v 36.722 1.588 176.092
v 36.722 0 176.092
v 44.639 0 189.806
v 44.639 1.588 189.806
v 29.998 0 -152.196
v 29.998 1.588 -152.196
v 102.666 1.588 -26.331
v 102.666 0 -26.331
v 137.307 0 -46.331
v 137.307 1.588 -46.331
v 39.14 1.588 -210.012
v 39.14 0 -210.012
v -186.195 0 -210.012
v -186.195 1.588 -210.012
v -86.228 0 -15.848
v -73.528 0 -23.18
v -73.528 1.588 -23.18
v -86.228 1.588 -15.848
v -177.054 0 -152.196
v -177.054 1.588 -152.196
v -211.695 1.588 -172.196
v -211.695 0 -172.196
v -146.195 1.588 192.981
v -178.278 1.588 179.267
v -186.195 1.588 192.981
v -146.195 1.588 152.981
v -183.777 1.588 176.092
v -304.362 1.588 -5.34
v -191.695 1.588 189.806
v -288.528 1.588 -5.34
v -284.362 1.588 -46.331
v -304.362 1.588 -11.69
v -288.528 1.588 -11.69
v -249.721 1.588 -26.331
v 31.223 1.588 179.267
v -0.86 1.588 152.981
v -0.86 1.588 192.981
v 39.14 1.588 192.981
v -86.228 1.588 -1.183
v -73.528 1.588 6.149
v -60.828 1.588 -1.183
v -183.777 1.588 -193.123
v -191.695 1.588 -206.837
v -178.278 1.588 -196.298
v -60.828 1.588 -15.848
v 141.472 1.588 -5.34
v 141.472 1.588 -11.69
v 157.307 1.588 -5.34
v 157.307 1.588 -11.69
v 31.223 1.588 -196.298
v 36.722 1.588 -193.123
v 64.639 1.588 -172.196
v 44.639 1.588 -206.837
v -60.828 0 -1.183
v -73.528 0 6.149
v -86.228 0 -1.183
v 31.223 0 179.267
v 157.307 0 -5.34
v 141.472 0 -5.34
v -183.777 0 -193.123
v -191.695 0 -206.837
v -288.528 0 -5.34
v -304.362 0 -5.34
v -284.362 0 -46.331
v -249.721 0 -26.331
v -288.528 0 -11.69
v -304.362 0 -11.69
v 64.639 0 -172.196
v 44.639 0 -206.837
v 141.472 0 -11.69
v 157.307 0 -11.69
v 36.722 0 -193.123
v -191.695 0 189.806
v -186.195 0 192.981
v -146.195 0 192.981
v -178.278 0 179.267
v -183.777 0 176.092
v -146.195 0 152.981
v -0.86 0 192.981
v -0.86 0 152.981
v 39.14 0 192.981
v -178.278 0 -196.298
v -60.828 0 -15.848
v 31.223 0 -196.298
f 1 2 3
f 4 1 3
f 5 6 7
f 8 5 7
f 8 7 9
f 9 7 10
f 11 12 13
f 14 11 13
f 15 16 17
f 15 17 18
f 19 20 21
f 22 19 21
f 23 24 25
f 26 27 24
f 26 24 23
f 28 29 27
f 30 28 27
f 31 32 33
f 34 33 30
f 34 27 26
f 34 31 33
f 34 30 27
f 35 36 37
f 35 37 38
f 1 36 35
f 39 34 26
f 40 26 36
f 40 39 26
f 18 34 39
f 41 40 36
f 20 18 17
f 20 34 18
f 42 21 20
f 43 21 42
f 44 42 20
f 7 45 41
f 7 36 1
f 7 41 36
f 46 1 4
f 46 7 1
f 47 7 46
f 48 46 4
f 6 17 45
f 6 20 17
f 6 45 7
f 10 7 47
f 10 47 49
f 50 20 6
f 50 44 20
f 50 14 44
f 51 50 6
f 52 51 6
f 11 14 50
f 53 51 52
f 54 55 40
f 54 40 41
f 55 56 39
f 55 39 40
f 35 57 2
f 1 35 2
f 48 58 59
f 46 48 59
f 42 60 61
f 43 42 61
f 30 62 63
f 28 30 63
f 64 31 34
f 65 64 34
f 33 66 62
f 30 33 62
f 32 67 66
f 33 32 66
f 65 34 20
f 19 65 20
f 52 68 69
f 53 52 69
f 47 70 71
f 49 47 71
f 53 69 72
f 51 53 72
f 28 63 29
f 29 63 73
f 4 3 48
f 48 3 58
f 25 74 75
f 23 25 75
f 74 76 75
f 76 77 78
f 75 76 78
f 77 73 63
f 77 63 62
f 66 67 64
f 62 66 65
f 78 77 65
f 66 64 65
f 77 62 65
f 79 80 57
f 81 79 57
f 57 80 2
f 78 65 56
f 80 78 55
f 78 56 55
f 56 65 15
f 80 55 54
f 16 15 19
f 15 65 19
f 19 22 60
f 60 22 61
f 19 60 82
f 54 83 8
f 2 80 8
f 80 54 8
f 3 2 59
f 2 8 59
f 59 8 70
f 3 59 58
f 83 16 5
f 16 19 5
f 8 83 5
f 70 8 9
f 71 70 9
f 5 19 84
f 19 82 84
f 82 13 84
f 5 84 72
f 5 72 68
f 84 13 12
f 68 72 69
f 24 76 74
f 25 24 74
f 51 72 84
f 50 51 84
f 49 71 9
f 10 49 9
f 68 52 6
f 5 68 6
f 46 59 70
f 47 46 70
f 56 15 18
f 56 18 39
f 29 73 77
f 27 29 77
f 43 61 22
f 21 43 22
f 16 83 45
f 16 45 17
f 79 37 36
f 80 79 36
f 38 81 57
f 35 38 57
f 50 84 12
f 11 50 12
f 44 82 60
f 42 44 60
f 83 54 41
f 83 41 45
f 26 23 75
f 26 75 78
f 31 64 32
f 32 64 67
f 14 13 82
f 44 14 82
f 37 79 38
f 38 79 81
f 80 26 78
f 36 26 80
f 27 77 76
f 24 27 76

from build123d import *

# Parameters (mm, degrees)
BOSS_EXTRUDE1_DEPTH = 1.5875
SKETCH2_W           = 145.335303163
SKETCH2_H           = 40
CUT_EXTRUDE1_DEPTH  = 1.5875


with BuildPart() as part:
    # Sketch1 → Boss-Extrude1 (new body)
    with BuildSketch(Plane(origin=(0, 0, 0), x_dir=(1, 0, 0), z_dir=(0, 1, 0))):
        Polygon((-186.195305431, -192.980619007), (39.139997732, -192.980619007), (31.222715493, -179.267483912), (36.721976807, -176.092483912), (44.63925905, -189.805619015), (157.306910641, 5.34047791), (141.472346164, 5.34047791), (141.47234615, 11.690477885), (157.306910636, 11.690477885), (44.639259046, 206.83657481), (36.721976807, 193.123439715), (31.222715493, 196.298439715), (39.139997732, 210.01157481), (-186.195305431, 210.01157481), (-178.278023193, 196.298439715), (-183.777284507, 193.123439715), (-191.694566745, 206.83657481), (-304.362218326, 11.690477902), (-288.52765385, 11.690477902), (-288.52765385, 5.340477902), (-304.362218326, 5.340477902), (-191.694566745, -189.805619007), (-183.777284507, -176.092483912), (-178.278023193, -179.267483912), align=None)
        Polygon((-86.22765385, 15.84782632), (-86.22765385, 1.183129483), (-73.52765385, -6.149218936), (-60.82765385, 1.183129483), (-60.82765385, 15.84782632), (-73.52765385, 23.180174739), align=None, mode=Mode.SUBTRACT)
    extrude(amount=BOSS_EXTRUDE1_DEPTH)

    # Sketch2 → Cut-Extrude1 (cut)
    with BuildSketch(Plane(origin=(0, 1.5875, 0), x_dir=(1, 0, 0), z_dir=(0, 1, 0))):
        with Locations((-73.527653849, -172.980619007)):
            Rectangle(SKETCH2_W, SKETCH2_H)
        Polygon((137.306910632, 46.331494061), (64.63925905, 172.195558667), (29.998242899, 152.195558667), (102.66589448, 26.331494061), align=None)
        Polygon((-211.694566745, 172.195558659), (-284.362218326, 46.331494053), (-249.721202175, 26.331494053), (-177.053550594, 152.195558659), align=None)
    extrude(amount=-CUT_EXTRUDE1_DEPTH, mode=Mode.SUBTRACT)


solid = part.part
